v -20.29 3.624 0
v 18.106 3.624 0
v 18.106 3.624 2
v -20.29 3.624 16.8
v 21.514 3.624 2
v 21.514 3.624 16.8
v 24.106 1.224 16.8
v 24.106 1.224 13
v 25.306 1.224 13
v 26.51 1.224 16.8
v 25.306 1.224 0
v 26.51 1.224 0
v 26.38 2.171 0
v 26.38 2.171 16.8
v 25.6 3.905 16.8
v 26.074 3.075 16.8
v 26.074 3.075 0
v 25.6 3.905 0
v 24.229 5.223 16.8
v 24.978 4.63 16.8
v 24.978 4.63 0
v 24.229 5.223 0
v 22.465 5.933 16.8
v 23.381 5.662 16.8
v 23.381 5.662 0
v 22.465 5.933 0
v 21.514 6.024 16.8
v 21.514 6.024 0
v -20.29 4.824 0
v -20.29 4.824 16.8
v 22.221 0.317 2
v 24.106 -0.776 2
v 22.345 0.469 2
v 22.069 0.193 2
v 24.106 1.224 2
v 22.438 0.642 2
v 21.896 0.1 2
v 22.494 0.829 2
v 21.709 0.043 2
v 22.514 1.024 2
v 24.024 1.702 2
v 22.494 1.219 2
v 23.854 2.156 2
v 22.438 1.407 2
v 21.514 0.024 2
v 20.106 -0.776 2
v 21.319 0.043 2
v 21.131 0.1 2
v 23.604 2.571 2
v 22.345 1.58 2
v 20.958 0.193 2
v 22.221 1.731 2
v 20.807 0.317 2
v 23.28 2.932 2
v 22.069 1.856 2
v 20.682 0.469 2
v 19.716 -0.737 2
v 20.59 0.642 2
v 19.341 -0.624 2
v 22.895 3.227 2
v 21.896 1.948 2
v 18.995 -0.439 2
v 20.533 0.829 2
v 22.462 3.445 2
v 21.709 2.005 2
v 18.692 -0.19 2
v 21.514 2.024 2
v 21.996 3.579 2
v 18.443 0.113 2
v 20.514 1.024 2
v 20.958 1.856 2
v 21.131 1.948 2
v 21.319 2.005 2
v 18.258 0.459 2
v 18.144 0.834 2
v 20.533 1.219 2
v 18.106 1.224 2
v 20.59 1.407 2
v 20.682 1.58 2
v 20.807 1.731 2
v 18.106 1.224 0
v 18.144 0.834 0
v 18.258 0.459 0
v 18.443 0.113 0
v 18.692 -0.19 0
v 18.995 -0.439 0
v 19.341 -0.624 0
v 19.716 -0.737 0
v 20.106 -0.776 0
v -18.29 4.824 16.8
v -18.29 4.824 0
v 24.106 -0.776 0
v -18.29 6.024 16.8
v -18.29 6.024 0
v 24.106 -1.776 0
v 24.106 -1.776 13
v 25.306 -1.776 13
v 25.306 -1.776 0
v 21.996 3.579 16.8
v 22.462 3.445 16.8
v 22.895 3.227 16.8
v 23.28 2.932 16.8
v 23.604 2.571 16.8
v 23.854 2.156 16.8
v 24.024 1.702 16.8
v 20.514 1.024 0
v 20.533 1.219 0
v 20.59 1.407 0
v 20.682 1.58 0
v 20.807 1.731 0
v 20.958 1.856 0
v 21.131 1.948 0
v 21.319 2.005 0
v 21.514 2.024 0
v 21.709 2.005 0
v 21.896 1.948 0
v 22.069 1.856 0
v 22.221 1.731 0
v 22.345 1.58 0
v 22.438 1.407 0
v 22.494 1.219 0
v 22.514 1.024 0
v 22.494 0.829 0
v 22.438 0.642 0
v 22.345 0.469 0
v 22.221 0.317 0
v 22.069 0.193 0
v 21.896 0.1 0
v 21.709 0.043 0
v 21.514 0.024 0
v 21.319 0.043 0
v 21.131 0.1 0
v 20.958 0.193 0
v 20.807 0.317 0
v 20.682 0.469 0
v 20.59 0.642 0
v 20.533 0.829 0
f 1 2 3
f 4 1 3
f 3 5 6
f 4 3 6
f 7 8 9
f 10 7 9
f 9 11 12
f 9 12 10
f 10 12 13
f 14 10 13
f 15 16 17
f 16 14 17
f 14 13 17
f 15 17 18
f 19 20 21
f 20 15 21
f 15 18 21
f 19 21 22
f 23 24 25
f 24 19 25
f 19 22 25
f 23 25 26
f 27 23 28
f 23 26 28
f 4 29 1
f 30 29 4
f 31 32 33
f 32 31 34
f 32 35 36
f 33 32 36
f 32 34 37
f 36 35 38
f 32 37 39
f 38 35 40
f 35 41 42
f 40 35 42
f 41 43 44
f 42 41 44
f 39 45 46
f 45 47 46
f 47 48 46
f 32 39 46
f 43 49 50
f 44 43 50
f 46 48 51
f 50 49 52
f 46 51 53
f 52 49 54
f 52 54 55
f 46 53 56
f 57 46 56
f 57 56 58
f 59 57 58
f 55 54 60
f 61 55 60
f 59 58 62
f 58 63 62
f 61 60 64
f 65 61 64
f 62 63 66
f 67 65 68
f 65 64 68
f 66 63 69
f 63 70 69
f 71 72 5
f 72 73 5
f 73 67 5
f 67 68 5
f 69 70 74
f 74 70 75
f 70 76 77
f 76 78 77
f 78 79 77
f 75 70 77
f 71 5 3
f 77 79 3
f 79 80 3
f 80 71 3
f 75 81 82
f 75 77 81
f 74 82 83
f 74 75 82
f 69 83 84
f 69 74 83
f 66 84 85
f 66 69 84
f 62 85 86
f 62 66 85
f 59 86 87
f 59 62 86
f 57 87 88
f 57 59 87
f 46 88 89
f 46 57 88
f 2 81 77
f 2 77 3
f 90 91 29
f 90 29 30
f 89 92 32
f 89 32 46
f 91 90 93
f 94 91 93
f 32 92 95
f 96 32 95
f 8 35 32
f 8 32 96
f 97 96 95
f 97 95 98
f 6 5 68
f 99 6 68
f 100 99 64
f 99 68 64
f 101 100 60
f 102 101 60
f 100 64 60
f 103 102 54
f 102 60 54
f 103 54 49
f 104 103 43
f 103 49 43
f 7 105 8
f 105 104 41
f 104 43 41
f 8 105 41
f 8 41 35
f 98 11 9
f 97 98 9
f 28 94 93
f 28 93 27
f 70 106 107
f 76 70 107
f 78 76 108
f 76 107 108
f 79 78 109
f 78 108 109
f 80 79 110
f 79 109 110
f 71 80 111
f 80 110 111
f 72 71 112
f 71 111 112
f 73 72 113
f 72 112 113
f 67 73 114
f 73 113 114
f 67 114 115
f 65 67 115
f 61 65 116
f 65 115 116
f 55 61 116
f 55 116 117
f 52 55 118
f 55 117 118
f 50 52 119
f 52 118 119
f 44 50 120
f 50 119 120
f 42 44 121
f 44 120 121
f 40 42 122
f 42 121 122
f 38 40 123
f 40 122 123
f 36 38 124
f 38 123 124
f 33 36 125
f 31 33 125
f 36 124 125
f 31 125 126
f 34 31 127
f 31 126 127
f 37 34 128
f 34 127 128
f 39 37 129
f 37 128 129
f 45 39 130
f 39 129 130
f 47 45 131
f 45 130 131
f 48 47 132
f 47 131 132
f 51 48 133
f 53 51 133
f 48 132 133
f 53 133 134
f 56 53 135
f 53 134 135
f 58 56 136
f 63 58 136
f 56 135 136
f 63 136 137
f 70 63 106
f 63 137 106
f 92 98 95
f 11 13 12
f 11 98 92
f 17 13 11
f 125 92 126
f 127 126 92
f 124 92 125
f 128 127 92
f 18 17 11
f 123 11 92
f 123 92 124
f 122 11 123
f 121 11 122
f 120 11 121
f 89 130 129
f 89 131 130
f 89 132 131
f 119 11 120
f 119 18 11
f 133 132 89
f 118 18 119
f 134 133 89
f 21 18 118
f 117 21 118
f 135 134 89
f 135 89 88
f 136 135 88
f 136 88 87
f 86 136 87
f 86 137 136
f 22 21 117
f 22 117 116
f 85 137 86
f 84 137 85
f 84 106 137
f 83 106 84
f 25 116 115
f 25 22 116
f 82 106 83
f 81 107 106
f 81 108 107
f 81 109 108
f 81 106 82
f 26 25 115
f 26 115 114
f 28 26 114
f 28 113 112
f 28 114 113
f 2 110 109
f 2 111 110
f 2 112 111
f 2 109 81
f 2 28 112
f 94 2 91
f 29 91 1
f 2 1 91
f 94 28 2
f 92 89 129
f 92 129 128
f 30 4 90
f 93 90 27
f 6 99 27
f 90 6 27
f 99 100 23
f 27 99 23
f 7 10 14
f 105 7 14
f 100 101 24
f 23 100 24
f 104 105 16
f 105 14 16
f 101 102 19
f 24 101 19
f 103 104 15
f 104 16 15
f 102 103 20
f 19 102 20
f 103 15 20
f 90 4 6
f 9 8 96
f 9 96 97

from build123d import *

# Parameters (mm, degrees)
SKETCH1_W           = 44.8
SKETCH1_H           = 4.8
BOSS_EXTRUDE1_DEPTH = 16.8
FILLET1_R           = 5
CUT_EXTRUDE1_DEPTH  = 32.95768929
SKETCH3_W           = 1.2
SKETCH3_H           = 13
BOSS_EXTRUDE2_DEPTH = 3
SKETCH4_W           = 16.8
SKETCH4_H           = 1.2
BOSS_EXTRUDE3_DEPTH = 2
SKETCH5_R           = 1
BOSS_EXTRUDE4_DEPTH = 2
FILLET2_R           = 2


with BuildPart() as part:
    # Sketch1 → Boss-Extrude1 (new body)
    with BuildSketch(Plane.XY):
        with Locations((4.109677419, 3.624193548)):
            Rectangle(SKETCH1_W, SKETCH1_H)
    extrude(amount=BOSS_EXTRUDE1_DEPTH)

    # Fillet1
    # the kernel refuses this fillet: 5 mm, written as the material it takes off along each edge
    with BuildSketch(Plane(origin=(26.509677419, 6.024193548, -12.489995997), x_dir=(-1, 0, 0), z_dir=(0, 0, 1))) as fillet1_piece_1:
        with BuildLine():
            CenterArc((4.995998399, 5), FILLET1_R, 182.292442776, 87.707557224)
            Line((0, 4.8), (-0.099919968, 4.796))
            ThreePointArc((-0.099919968, 4.796), (-0.1, 2.4), (-0.1, 0))
            Line((-0.1, 0), (0, -0.1))
            Line((0, -0.1), (4.995998399, -0.1))
            Line((4.995998399, -0.1), (4.995998399, 0))
        make_face()
    extrude(amount=41.779991994, mode=Mode.SUBTRACT)

    # Sketch2 → Cut-Extrude1 (cut, through all)
    with BuildSketch(Plane(origin=(0, 0, 0), x_dir=(-1, 0, 0), z_dir=(0, 0, -1))):
        with BuildLine():
            Line((-24.1059753, 1.224193548), (18.290322581, 1.224193548))
            Line((18.290322581, 1.224193548), (18.290322581, 3.624193548))
            Line((18.290322581, 3.624193548), (-21.513679021, 3.624193548))
            ThreePointArc((-21.513679021, 3.624193548), (-23.280031194, 2.932071951), (-24.1059753, 1.224193548))
        make_face()
    extrude(amount=-CUT_EXTRUDE1_DEPTH, mode=Mode.SUBTRACT)

    # Sketch3 → Boss-Extrude2 (add)
    with BuildSketch(Plane.XZ.offset(-1.224193548)):
        with Locations((24.7059753, 6.5)):
            Rectangle(SKETCH3_W, SKETCH3_H)
    extrude(amount=BOSS_EXTRUDE2_DEPTH)

    # Sketch4 → Boss-Extrude3 (add)
    with BuildSketch(Plane.ZY.offset(18.290322581)):
        with Locations((8.4, 4.224193548)):
            Rectangle(SKETCH4_W, SKETCH4_H)
    extrude(amount=BOSS_EXTRUDE3_DEPTH)

    # Sketch5 → Boss-Extrude4 (add)
    with BuildSketch(Plane(origin=(0, 0, 0), x_dir=(-1, 0, 0), z_dir=(0, 0, -1))):
        with BuildLine():
            Line((-18.1059753, -0.775806452), (-18.1059753, 3.624193548))
            Line((-18.1059753, 3.624193548), (-21.513679021, 3.624193548))
            ThreePointArc((-21.513679021, 3.624193548), (-23.280031194, 2.932071951), (-24.1059753, 1.224193548))
            Line((-24.1059753, 1.224193548), (-24.1059753, -0.775806452))
            Line((-24.1059753, -0.775806452), (-18.1059753, -0.775806452))
        make_face()
        with Locations((-21.513679021, 1.024193548)):
            Circle(SKETCH5_R, mode=Mode.SUBTRACT)
    extrude(amount=-BOSS_EXTRUDE4_DEPTH)

    # Fillet2
    fillet2_edges = [part.edges().sort_by_distance(p)[0] for p in [
        (18.1059753, -0.775806452, 1),
    ]]
    fillet(fillet2_edges, radius=FILLET2_R)


solid = part.part
